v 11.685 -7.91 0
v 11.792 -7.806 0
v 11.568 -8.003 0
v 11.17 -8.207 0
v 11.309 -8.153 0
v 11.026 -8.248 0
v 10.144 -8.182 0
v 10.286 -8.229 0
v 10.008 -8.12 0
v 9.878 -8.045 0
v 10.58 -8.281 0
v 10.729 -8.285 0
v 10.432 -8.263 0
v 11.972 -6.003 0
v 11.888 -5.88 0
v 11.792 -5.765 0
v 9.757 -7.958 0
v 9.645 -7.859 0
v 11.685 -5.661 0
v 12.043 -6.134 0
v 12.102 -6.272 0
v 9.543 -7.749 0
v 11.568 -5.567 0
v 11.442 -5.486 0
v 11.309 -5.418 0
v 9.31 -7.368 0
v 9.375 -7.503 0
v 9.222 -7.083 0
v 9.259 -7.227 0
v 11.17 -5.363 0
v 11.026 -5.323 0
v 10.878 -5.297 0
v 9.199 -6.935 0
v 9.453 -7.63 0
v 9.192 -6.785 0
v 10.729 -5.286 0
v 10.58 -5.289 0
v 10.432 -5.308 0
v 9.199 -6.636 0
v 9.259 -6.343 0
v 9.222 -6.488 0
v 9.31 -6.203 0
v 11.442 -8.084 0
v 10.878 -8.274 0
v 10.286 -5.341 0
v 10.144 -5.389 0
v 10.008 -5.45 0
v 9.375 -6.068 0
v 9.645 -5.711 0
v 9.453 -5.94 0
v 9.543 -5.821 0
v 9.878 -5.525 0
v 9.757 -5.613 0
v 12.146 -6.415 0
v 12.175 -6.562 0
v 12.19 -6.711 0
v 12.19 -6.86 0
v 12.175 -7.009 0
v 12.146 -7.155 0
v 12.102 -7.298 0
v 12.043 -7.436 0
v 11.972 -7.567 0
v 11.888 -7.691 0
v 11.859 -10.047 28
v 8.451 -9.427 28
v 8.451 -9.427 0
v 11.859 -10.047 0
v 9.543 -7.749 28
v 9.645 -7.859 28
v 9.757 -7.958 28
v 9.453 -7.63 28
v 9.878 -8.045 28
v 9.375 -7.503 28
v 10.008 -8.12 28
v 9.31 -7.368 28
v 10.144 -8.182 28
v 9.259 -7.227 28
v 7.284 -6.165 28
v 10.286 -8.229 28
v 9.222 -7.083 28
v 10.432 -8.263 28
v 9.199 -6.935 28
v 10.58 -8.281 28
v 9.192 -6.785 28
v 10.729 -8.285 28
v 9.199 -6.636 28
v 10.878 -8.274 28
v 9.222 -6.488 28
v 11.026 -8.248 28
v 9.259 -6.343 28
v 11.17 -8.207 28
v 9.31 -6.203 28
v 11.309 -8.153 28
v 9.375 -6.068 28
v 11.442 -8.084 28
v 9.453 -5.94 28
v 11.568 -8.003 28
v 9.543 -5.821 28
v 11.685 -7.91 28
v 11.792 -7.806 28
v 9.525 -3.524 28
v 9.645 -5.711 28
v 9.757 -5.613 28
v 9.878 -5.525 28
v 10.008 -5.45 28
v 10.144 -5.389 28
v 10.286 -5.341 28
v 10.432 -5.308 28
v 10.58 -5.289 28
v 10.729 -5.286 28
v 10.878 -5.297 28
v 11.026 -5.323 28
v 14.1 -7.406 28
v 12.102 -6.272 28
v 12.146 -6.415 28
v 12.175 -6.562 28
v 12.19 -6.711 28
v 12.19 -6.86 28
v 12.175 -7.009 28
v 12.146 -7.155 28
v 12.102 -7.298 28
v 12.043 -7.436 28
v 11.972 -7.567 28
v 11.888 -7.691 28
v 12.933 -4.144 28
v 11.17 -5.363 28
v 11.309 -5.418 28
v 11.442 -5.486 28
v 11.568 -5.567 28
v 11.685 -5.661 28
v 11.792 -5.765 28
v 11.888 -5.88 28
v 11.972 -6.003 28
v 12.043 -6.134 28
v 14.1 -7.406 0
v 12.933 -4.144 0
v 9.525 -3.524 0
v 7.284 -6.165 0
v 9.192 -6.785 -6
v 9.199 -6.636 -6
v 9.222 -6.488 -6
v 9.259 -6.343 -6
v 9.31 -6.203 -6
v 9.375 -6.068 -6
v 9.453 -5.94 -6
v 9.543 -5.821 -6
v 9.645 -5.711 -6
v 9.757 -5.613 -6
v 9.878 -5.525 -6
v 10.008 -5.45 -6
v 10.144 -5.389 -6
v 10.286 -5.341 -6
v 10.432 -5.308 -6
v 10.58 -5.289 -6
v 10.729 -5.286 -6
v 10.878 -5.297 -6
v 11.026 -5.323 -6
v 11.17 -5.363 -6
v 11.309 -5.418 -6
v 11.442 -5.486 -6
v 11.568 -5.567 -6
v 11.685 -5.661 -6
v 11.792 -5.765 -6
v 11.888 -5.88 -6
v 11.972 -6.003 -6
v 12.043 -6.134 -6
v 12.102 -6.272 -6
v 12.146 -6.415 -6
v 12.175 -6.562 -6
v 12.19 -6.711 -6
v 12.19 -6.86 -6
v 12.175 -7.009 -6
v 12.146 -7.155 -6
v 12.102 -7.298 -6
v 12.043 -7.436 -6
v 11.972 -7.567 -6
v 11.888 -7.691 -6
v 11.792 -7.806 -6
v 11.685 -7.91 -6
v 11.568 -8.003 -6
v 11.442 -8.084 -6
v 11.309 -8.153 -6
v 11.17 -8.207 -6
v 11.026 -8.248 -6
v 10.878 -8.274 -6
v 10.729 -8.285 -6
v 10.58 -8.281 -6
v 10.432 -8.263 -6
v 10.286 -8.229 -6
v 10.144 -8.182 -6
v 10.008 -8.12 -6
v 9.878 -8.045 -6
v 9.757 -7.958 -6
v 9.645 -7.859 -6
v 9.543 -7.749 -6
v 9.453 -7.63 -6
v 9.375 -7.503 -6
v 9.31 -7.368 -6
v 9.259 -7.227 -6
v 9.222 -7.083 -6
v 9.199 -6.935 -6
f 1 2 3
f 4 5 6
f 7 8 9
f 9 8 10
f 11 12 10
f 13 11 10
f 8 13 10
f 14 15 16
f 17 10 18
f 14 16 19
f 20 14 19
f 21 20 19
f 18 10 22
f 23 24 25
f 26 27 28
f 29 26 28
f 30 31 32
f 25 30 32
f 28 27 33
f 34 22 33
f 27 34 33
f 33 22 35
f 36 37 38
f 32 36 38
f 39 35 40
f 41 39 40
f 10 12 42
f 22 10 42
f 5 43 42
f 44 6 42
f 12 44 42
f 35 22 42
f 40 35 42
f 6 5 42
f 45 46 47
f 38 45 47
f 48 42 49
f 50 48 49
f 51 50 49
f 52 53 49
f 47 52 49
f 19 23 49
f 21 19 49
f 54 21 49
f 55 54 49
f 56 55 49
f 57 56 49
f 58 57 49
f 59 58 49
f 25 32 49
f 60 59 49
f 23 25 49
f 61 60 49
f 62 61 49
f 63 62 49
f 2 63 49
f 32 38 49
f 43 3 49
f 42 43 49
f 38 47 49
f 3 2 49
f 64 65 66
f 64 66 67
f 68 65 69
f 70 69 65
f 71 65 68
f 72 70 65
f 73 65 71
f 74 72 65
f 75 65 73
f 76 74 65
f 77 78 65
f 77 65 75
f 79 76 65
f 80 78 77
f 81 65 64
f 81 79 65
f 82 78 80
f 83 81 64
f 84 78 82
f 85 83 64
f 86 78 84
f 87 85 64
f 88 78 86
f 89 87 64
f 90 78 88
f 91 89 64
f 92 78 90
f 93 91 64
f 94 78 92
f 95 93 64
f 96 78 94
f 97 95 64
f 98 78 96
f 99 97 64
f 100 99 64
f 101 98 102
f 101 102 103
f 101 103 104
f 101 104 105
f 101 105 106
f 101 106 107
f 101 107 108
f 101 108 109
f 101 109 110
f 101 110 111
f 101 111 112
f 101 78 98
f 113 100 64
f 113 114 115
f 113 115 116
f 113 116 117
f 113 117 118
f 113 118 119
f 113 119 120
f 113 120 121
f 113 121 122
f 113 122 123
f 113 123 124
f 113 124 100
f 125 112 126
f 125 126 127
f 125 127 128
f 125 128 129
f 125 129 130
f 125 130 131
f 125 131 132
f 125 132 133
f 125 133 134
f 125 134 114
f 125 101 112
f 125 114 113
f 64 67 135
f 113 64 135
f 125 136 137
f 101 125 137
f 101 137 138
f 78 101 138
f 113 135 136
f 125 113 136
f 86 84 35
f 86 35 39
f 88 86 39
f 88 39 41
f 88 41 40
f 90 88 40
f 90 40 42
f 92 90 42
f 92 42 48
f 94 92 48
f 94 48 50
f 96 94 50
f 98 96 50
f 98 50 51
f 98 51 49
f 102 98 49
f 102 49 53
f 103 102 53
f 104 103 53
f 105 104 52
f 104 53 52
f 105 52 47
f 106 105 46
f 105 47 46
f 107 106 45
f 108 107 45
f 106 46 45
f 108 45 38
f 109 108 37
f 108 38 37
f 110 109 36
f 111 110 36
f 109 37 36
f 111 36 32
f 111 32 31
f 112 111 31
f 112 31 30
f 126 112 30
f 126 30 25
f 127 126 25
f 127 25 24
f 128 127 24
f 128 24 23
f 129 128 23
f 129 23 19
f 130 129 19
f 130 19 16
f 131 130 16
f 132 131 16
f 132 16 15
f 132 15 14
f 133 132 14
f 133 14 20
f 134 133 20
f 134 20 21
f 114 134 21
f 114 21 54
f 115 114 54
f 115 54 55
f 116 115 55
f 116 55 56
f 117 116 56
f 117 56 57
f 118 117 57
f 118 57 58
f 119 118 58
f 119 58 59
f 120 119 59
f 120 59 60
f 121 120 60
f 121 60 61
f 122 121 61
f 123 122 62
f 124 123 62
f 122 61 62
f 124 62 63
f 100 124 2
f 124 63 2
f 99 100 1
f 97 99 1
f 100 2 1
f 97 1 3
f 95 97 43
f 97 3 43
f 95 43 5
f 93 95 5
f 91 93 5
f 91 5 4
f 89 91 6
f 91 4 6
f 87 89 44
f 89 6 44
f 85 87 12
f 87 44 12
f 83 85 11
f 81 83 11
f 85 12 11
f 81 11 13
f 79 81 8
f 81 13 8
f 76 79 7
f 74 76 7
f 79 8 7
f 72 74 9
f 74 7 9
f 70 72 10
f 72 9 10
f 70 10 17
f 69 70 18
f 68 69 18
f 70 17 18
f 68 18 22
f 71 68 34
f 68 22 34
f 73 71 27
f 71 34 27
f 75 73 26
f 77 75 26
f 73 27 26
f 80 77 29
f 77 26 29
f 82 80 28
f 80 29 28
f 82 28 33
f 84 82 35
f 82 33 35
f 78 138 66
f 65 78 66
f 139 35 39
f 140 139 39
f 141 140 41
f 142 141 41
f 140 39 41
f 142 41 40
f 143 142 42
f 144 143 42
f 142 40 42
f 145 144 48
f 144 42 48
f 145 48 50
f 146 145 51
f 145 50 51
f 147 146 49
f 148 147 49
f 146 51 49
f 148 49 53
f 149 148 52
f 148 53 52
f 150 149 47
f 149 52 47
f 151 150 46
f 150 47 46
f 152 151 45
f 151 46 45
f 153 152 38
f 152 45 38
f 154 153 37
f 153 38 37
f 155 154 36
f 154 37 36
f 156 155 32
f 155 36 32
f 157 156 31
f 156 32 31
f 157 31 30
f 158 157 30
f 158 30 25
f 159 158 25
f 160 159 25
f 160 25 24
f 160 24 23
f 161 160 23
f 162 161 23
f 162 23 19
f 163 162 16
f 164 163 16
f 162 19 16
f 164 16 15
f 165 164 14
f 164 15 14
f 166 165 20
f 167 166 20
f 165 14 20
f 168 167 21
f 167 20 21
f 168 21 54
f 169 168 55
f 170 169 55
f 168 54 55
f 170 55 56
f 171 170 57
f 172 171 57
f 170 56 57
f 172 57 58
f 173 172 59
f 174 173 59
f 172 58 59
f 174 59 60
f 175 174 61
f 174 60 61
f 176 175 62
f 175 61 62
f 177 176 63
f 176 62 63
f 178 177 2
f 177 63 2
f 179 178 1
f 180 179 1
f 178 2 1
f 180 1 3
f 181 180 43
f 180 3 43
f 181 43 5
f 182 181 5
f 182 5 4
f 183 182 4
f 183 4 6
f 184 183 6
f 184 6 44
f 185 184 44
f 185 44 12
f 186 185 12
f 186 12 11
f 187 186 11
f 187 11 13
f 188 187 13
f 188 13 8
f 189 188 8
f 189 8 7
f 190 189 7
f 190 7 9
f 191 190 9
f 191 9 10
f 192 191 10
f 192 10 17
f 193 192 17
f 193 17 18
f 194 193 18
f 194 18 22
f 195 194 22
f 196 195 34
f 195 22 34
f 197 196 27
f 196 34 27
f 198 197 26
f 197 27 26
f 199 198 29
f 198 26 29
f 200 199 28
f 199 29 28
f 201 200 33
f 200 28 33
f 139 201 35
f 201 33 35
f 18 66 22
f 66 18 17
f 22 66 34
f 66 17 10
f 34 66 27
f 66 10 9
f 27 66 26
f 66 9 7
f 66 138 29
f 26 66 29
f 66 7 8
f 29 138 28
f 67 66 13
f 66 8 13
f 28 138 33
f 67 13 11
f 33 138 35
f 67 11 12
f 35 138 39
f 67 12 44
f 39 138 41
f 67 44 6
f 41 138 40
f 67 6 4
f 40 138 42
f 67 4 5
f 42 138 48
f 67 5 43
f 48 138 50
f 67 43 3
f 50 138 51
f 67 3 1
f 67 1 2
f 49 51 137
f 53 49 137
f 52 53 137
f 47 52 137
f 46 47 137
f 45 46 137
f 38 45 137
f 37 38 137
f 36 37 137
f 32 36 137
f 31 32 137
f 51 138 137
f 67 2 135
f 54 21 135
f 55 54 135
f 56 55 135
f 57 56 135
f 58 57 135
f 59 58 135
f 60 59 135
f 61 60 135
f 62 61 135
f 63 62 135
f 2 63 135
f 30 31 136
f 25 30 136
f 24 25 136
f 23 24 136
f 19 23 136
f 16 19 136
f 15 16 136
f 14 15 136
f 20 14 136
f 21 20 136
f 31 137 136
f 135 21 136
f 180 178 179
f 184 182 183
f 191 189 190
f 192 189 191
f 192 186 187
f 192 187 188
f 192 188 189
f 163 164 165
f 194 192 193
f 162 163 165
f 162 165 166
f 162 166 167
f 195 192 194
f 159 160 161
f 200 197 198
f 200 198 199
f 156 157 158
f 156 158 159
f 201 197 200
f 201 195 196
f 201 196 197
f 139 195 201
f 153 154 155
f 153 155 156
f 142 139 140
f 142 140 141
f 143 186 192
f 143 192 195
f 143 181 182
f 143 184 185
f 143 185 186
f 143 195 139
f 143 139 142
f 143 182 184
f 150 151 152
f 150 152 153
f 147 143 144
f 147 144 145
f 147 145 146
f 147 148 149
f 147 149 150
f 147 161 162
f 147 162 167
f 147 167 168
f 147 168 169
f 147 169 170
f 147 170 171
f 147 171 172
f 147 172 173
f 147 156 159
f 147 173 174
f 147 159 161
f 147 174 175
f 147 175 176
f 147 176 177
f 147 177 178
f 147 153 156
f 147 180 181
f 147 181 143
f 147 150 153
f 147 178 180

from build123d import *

# Parameters (mm, degrees)
RESSALTO_EXTRUS_O1_DEPTH = 28
ESBO_O4_R                = 1.5
CORTE_EXTRUS_O2_DEPTH    = 40
ESBO_O6_R                = 1.5
RESSALTO_EXTRUS_O2_DEPTH = 6


with BuildPart() as part:
    # Esboço1 → Ressalto-extrusão1 (new body)
    with BuildSketch(Plane.XY):
        Polygon((12.933175524, -4.143885809), (9.525050306, -3.523658029), (7.283854683, -6.165067156), (8.450784277, -9.426704064), (11.858909495, -10.046931845), (14.100105118, -7.405522718), align=None)
    extrude(amount=RESSALTO_EXTRUS_O1_DEPTH)

    # Esboço4 → Corte-extrusão2 (cut)
    with BuildSketch(Plane(origin=(0, 0, 0), x_dir=(-1, 0, 0), z_dir=(0, 0, -1))):
        with Locations((-10.691979901, -6.785294937)):
            Circle(ESBO_O4_R)
    extrude(amount=-CORTE_EXTRUS_O2_DEPTH, mode=Mode.SUBTRACT)


with BuildPart() as body_2:
    # Esboço6 → Ressalto-extrusão2 (new body)
    with BuildSketch(Plane(origin=(0, 0, 0), x_dir=(-1, 0, 0), z_dir=(0, 0, -1))):
        with Locations((-10.691979901, -6.785294937)):
            Circle(ESBO_O6_R)
    extrude(amount=RESSALTO_EXTRUS_O2_DEPTH)


solid = Compound([part.part, body_2.part])
